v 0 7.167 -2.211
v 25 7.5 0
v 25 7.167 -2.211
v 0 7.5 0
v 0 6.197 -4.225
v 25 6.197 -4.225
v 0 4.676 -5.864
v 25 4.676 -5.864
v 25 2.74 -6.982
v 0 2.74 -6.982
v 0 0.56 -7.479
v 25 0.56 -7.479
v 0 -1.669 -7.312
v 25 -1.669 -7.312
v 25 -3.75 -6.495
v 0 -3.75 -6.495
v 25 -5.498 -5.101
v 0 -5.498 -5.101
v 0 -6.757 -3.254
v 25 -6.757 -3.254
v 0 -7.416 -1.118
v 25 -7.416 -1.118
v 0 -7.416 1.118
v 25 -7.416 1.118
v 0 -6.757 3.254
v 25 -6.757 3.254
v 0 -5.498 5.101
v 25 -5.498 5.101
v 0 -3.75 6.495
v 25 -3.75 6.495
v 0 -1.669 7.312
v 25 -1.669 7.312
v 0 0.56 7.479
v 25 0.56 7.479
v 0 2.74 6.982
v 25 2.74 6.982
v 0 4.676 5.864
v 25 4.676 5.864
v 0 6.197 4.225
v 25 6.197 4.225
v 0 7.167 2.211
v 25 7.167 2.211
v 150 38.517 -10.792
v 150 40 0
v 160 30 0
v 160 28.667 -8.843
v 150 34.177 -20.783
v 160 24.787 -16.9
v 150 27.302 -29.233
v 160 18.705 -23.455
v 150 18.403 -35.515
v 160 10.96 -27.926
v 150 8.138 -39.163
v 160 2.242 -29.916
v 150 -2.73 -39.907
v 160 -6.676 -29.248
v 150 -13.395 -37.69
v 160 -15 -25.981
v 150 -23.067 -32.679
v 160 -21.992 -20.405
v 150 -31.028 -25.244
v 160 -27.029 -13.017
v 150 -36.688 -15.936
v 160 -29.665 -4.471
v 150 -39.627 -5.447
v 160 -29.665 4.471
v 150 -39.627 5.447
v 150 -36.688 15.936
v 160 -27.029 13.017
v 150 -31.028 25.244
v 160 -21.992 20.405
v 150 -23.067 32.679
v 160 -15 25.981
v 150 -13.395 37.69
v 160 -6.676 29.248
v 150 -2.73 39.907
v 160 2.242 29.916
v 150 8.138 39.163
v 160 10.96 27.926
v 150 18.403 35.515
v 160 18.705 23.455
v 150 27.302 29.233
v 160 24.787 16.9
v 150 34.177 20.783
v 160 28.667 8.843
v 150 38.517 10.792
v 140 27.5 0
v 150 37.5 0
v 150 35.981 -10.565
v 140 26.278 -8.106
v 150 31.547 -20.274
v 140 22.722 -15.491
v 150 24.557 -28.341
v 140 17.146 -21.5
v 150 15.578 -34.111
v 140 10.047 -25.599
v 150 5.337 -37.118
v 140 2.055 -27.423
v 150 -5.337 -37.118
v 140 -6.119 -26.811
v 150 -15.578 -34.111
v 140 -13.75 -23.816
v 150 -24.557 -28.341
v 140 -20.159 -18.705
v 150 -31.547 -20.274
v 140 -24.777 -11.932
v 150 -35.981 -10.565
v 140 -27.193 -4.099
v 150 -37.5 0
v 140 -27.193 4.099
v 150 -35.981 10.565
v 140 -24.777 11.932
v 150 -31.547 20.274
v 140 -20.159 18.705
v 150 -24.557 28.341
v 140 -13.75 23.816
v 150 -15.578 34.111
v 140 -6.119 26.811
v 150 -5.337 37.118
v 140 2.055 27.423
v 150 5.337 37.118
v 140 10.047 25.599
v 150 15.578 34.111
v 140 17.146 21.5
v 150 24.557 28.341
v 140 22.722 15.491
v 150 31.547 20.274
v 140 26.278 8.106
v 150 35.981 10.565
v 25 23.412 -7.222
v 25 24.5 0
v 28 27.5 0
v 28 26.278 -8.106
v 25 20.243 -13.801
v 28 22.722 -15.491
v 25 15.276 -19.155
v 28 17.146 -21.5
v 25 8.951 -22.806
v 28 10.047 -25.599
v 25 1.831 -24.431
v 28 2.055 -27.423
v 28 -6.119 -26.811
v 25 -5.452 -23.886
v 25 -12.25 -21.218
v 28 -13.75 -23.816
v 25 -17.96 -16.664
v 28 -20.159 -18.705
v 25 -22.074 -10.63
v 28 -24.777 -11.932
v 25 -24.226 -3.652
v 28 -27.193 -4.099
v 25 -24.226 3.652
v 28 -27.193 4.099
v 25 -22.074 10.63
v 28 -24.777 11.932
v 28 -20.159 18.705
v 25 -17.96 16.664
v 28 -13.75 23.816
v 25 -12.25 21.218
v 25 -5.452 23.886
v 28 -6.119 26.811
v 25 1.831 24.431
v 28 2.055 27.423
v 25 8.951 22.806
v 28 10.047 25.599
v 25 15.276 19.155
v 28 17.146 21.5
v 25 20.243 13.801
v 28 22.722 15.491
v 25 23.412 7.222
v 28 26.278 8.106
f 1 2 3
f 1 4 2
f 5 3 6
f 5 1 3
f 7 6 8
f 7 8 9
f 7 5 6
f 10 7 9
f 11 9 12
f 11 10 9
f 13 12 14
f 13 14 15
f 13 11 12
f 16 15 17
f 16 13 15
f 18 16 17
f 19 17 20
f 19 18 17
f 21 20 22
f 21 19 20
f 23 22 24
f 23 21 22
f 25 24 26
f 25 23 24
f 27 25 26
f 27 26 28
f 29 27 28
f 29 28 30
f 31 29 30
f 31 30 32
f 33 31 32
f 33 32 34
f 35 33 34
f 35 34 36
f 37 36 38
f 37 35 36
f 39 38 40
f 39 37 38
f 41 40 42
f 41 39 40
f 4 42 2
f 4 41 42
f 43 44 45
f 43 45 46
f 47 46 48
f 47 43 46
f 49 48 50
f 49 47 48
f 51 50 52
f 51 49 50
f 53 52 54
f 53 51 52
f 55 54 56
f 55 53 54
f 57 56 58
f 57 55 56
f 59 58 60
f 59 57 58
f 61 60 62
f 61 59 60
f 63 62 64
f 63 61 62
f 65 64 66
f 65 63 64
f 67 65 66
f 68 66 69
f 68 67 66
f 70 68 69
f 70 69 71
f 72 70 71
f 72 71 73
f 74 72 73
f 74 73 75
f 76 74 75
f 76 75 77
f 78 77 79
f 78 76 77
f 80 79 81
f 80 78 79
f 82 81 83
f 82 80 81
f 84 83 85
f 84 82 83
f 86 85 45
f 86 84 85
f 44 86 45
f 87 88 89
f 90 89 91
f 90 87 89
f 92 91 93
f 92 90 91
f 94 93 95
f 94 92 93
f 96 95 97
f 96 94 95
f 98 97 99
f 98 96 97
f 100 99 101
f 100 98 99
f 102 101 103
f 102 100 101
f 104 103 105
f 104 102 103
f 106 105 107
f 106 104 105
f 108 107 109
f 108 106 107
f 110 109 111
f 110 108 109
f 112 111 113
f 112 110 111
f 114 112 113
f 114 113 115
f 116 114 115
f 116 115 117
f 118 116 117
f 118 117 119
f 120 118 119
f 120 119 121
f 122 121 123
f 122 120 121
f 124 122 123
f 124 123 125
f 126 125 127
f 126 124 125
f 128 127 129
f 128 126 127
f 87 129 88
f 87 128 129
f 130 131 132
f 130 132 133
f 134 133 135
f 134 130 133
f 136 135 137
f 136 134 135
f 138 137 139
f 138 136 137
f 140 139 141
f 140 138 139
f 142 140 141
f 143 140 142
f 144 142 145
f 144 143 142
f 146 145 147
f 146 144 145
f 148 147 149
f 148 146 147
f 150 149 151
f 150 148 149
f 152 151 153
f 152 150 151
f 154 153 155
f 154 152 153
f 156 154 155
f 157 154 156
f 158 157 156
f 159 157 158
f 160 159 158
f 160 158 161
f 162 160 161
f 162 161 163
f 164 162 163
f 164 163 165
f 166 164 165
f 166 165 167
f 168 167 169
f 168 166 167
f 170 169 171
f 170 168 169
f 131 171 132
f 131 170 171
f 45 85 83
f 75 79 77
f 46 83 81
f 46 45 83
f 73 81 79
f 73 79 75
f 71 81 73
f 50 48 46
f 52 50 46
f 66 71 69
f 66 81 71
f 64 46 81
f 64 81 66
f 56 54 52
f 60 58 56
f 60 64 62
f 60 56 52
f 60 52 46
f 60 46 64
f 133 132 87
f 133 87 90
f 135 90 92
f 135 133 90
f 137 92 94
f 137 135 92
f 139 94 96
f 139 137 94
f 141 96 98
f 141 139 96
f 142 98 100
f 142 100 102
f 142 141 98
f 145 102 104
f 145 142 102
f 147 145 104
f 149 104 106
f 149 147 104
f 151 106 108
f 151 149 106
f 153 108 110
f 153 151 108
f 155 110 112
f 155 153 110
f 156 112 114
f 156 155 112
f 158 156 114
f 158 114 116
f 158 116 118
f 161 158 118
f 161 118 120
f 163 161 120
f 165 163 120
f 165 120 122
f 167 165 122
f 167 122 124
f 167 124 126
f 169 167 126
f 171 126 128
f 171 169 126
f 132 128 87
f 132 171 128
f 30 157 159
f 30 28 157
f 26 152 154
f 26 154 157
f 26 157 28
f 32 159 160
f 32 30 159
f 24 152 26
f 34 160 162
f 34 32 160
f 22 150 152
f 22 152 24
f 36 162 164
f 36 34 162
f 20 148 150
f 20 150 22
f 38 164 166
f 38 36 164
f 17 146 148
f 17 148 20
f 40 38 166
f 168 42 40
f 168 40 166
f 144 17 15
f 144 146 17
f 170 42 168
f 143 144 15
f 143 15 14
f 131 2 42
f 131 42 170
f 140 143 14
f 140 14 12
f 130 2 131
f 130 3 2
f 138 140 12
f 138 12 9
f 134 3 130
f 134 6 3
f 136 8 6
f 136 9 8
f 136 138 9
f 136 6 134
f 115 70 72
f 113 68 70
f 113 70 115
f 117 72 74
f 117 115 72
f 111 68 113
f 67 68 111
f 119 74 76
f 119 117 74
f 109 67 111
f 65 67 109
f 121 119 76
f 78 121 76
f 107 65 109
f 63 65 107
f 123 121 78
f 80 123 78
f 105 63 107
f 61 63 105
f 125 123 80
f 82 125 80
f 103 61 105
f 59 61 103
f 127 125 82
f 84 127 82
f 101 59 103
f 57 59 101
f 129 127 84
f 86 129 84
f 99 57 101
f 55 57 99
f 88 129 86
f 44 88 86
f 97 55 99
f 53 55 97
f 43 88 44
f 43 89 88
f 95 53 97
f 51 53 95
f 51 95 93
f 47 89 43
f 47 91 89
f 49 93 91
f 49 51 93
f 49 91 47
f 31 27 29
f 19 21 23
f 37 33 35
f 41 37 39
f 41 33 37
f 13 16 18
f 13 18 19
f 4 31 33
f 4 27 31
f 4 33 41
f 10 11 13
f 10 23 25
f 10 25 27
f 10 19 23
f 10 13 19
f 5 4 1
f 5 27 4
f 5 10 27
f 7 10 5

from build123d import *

# Parameters (mm, degrees)
F2_SIZE = 9.99999
F3_SIZE = 3


# Not quite as in the source:
# - a fillet or chamfer is up to 0.001 mm smaller than in the source, because OpenCascade refuses the exact size


with BuildPart() as f1:
    # F0 (on Top) → F1 (revolve)
    with BuildSketch(Plane.XY):
        Polygon((0, 7.5), (0, 0), (160, 0), (160, 40), (150, 40), (150, 27.5), (25, 27.5), (25, 7.5), align=None)
    revolve(axis=Axis((80, 0, 0), (-1, 0, 0)))

    # F2 (size 10 in the source; OpenCascade refuses exactly that, so slightly less here)
    f2_edges = [f1.edges().sort_by_distance(p)[0] for p in [
        (160, -40, 0),
        (150, -27.5, 0),
    ]]
    chamfer(f2_edges, length=F2_SIZE)

    # F3
    f3_edges = [f1.edges().sort_by_distance(p)[0] for p in [
        (25, -27.5, 0),
    ]]
    chamfer(f3_edges, length=F3_SIZE)


solid = f1.part
